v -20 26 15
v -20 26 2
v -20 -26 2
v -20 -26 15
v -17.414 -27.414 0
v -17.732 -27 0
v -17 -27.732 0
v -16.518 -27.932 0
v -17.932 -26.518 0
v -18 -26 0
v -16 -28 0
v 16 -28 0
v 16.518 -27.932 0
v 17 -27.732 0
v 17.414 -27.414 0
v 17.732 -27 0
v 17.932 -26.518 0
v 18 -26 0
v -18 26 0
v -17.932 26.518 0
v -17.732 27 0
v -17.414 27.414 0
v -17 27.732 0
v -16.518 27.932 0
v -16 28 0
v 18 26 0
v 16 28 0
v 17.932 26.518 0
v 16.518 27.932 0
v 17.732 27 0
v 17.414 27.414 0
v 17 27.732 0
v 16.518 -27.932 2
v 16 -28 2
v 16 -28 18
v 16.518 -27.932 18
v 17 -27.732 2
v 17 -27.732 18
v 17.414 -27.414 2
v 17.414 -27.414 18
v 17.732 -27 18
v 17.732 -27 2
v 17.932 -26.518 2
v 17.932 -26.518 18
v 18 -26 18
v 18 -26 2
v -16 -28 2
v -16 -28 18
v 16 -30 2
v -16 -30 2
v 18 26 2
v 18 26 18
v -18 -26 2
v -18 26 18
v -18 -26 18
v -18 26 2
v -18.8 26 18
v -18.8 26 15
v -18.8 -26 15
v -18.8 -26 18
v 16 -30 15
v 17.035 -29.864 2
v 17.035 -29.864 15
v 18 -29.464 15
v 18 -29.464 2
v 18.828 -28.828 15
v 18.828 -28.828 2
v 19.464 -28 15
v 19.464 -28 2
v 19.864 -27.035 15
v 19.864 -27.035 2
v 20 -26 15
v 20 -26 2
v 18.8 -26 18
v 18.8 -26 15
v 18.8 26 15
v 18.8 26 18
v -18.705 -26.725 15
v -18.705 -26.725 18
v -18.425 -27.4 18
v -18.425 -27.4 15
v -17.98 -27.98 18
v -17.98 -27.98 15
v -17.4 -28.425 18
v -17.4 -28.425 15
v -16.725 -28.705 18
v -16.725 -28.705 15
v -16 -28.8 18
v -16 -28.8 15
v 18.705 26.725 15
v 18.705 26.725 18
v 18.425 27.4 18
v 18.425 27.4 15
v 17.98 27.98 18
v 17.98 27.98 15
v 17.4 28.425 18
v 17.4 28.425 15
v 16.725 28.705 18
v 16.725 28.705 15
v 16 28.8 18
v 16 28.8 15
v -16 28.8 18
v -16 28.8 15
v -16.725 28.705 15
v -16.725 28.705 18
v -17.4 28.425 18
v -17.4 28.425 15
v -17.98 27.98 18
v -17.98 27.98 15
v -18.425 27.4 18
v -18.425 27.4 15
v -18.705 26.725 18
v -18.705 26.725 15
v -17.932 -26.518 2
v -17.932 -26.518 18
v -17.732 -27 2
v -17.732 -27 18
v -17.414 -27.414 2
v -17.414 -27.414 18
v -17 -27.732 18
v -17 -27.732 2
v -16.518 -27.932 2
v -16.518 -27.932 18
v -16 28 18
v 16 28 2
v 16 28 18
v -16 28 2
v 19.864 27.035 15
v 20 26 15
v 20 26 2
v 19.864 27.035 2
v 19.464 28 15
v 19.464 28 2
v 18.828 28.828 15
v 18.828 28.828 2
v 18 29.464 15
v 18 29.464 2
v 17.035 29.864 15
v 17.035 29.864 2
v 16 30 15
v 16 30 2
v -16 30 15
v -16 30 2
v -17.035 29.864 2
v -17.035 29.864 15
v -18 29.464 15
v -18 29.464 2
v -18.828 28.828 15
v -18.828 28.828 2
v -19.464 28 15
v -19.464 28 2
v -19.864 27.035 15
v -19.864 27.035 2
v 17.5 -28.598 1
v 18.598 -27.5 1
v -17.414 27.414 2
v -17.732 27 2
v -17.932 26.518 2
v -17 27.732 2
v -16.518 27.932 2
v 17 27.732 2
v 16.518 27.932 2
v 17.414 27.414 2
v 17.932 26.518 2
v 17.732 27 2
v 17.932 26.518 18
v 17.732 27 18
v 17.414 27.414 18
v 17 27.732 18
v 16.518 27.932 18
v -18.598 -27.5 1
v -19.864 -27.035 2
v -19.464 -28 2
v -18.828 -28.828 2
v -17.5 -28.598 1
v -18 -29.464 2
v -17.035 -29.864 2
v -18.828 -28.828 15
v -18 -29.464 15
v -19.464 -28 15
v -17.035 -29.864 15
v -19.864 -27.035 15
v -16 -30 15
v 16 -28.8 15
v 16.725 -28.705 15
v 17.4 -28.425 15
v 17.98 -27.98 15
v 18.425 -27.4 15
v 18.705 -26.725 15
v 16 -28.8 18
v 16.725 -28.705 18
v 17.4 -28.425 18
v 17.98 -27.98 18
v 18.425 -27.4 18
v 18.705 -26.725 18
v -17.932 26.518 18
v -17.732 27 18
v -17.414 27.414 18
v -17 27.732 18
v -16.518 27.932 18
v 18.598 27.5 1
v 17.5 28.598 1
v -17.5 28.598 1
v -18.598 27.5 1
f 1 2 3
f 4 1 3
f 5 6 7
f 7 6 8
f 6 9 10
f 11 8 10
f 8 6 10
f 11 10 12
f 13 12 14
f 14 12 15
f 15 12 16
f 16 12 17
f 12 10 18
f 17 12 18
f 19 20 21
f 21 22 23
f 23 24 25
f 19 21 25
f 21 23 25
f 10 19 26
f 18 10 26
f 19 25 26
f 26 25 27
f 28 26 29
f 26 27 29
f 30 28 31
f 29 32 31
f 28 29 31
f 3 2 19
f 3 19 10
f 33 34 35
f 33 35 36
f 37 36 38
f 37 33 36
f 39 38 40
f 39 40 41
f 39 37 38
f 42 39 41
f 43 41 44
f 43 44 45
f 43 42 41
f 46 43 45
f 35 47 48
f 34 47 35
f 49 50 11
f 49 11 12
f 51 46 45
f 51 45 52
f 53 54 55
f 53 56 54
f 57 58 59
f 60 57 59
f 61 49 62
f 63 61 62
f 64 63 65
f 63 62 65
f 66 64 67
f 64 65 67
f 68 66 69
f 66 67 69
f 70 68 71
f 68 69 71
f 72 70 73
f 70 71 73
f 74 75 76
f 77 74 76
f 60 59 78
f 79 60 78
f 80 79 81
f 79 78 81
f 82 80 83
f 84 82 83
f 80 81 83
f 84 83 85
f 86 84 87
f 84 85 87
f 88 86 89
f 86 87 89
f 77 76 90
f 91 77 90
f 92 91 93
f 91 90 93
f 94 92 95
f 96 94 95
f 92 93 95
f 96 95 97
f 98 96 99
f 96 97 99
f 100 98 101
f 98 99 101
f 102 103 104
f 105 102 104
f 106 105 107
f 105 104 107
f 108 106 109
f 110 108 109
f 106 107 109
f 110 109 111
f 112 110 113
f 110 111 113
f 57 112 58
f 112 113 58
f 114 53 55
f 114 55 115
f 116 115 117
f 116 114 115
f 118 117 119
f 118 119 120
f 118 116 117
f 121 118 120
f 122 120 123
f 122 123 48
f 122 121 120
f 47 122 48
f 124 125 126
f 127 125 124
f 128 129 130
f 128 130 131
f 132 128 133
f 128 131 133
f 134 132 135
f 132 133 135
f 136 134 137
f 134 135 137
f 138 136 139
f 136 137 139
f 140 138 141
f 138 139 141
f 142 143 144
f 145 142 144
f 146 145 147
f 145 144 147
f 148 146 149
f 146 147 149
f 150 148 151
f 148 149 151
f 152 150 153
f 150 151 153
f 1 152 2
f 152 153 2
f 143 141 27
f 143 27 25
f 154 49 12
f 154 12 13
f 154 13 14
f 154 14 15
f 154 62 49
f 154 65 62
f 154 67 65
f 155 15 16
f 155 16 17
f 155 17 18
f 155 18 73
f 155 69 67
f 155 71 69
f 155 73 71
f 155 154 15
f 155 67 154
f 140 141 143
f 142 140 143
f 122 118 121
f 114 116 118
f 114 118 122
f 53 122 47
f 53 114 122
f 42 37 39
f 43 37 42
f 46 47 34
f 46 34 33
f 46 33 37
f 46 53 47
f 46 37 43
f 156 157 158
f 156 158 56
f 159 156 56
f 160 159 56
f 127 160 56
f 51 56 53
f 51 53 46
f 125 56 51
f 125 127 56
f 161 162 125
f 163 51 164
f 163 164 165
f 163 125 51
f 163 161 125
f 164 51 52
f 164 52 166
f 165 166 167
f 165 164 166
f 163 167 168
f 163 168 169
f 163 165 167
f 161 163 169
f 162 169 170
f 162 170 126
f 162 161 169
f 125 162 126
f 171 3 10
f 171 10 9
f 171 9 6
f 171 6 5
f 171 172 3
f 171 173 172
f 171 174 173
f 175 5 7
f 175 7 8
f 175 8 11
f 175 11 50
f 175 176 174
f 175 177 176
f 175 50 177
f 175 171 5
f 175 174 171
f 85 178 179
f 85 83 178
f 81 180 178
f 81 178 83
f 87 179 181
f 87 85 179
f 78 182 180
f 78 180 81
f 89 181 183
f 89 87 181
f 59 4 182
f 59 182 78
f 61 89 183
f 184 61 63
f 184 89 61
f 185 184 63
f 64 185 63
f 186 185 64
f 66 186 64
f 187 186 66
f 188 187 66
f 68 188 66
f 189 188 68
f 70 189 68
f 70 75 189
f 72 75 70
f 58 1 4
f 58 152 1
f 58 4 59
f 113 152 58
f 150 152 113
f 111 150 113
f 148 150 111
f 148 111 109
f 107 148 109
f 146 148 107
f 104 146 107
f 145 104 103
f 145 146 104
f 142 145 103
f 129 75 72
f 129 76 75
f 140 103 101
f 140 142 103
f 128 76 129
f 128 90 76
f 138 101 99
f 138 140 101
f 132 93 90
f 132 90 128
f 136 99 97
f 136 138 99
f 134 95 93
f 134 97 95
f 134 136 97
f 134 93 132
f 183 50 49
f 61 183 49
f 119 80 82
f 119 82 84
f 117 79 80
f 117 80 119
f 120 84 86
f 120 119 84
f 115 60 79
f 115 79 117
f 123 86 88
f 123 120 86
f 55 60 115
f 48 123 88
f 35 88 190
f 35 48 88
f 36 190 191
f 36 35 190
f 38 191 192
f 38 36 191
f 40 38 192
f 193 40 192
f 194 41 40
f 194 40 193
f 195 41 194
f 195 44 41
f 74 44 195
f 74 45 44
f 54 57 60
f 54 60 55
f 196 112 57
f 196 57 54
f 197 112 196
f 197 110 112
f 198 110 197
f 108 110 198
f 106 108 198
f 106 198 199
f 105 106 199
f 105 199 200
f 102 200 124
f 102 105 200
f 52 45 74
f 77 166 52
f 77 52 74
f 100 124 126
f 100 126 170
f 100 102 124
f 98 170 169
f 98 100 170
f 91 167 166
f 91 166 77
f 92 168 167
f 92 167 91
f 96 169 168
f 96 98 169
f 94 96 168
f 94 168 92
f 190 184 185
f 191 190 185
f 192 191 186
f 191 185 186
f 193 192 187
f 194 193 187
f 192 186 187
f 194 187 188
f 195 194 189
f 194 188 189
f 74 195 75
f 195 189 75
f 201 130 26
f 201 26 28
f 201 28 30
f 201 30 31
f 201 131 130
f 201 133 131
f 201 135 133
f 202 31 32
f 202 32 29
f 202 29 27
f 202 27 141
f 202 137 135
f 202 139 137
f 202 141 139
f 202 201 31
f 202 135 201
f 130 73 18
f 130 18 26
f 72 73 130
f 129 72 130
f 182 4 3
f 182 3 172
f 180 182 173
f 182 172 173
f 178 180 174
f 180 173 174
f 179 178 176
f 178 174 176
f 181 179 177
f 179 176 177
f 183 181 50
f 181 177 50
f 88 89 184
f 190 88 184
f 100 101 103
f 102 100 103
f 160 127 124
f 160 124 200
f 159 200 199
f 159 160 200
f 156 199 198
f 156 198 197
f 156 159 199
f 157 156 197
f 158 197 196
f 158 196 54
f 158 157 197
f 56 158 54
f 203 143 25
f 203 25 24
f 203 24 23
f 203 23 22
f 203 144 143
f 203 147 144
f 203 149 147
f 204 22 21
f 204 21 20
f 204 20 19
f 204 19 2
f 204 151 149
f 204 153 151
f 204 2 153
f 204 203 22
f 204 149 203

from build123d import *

# Parameters (mm, degrees)
PAD_DEPTH    = 15
POCKET_DEPTH = 13
PAD001_DEPTH = 3
CHAMFER_SIZE = 2


with BuildPart() as part:
    # Sketch → Pad (new body)
    with BuildSketch(Plane.XY):
        with BuildLine():
            Line((-20, 26), (-20, -26))
            ThreePointArc((-20, -26), (-18.828427, -28.828427), (-16, -30))
            Line((-16, -30), (16, -30))
            ThreePointArc((16, -30), (18.828427, -28.828427), (20, -26))
            Line((20, -26), (20, 26))
            ThreePointArc((20, 26), (18.828427, 28.828427), (16, 30))
            Line((16, 30), (-16, 30))
            ThreePointArc((-16, 30), (-18.828427, 28.828427), (-20, 26))
        make_face()
    extrude(amount=PAD_DEPTH)

    # Sketch001 (on Face10 of Pad) → Pocket (cut)
    with BuildSketch(Plane.XY.offset(15)):
        with BuildLine():
            Line((-18, 26), (-18, -26))
            ThreePointArc((-18, -26), (-17.414214, -27.414214), (-16, -28))
            Line((-16, -28), (16, -28))
            ThreePointArc((16, -28), (17.414214, -27.414214), (18, -26))
            Line((18, -26), (18, 26))
            ThreePointArc((18, 26), (17.414214, 27.414214), (16, 28))
            Line((16, 28), (-16, 28))
            ThreePointArc((-16, 28), (-17.414214, 27.414214), (-18, 26))
        make_face()
    extrude(amount=-POCKET_DEPTH, mode=Mode.SUBTRACT)

    # Sketch002 (on Face5 of Pocket) → Pad001 (join)
    with BuildSketch(Plane.XY.offset(15)):
        with BuildLine():
            Line((-18.8, 26), (-18.8, -26))
            ThreePointArc((-18.8, -26), (-17.979899, -27.979899), (-16, -28.8))
            Line((-16, -28.8), (16, -28.8))
            ThreePointArc((16, -28.8), (17.979899, -27.979899), (18.8, -26))
            Line((18.8, -26), (18.8, 26))
            ThreePointArc((18.8, 26), (17.979899, 27.979899), (16, 28.8))
            Line((16, 28.8), (-16, 28.8))
            ThreePointArc((-16, 28.8), (-17.979899, 27.979899), (-18.8, 26))
        make_face()
        with BuildLine():
            Line((-18, 26), (-18, -26))
            ThreePointArc((-18, -26), (-17.414214, -27.414214), (-16, -28))
            Line((-16, -28), (16, -28))
            ThreePointArc((16, -28), (17.414214, -27.414214), (18, -26))
            Line((18, -26), (18, 26))
            ThreePointArc((18, 26), (17.414214, 27.414214), (16, 28))
            Line((16, 28), (-16, 28))
            ThreePointArc((-16, 28), (-17.414214, 27.414214), (-18, 26))
        make_face(mode=Mode.SUBTRACT)
    extrude(amount=PAD001_DEPTH)

    # Chamfer
    chamfer_edges = [part.edges().sort_by_distance(p)[0] for p in [
        (0, -30, 0),
        (18.828427, -28.828427, 0),
        (20, 0, 0),
        (18.828427, 28.828427, 0),
        (0, 30, 0),
        (-18.828427, 28.828427, 0),
        (-20, 0, 0),
        (-18.828427, -28.828427, 0),
    ]]
    chamfer(chamfer_edges, length=CHAMFER_SIZE)


solid = part.part
